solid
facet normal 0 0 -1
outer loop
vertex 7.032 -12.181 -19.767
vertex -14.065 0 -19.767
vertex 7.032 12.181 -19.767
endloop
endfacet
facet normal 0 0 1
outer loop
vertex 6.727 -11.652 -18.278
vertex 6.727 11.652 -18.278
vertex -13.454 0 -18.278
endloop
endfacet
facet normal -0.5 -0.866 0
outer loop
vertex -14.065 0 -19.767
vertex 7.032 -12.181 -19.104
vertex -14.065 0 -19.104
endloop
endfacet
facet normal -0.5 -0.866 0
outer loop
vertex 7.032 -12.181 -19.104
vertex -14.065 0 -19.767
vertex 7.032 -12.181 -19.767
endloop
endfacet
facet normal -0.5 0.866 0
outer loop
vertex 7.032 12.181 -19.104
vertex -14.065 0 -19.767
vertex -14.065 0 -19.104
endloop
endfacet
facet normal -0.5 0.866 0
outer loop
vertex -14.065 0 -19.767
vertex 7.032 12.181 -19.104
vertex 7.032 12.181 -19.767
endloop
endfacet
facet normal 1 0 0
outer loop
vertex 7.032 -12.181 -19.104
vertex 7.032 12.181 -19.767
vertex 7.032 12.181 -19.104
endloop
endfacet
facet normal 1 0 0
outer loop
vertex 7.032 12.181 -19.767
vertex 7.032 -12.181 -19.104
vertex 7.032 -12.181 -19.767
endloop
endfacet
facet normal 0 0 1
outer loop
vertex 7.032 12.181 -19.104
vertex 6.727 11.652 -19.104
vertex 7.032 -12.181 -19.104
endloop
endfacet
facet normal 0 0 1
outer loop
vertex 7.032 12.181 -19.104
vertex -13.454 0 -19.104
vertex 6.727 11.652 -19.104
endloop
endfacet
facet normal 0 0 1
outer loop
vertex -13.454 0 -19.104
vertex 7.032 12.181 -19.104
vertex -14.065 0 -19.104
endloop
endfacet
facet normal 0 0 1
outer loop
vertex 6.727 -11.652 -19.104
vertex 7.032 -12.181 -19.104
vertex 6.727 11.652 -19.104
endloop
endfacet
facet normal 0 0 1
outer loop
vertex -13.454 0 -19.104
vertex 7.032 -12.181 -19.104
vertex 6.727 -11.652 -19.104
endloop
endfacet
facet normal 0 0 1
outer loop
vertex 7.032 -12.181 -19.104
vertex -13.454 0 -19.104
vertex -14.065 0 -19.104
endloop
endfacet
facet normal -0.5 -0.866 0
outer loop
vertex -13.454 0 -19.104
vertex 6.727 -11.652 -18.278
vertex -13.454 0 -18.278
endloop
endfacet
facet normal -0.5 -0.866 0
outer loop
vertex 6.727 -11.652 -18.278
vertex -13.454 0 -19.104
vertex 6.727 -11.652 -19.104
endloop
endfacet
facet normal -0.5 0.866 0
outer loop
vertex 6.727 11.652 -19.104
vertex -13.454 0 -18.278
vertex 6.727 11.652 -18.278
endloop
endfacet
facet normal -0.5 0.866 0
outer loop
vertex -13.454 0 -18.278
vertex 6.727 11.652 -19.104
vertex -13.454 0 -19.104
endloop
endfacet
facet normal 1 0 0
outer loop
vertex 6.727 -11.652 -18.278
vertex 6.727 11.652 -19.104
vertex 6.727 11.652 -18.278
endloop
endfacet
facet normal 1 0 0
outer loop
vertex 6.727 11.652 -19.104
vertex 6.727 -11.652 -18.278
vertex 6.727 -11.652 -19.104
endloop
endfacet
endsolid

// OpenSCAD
angle = 20.905;
externalRadius = 25;
internalRdius = 23.117; // Pour épaisseur paroi 1.5 mm
diametreTrouBouchon = 1.5;
echelleReductionAjustementBouchon = 0.97;
r = 0.19; // résolution d'impression sur l'axe Z

//ico_creux();
//decoupe_bouchon();
//corps_ouvert();
bouchon();
//trou();

module corps_ouvert() {
    //rotate([180, 0, 0])
	difference() {
		ico_creux();
		decoupe_bouchon();
	}
}

module bouchon() {
    rotate([180, 0, 0])
	scale([echelleReductionAjustementBouchon, echelleReductionAjustementBouchon, 0.995])
	difference () {
        intersection() {
            ico_creux();
            decoupe_bouchon(echelleReductionAjustementBouchon);
        }
	}
}
module bouchon_trou(version) {
	scale([echelleReductionAjustementBouchon, echelleReductionAjustementBouchon, 0.98])
	difference () {
        intersection() {
            ico_creux();
            decoupe_bouchon(echelleReductionAjustementBouchon);
        }
        trou();
        // trou centre face
//		translate([0, 0, externalRadius*0.5])
//		cylinder(30, r=diametreTrouBouchon/2, $fn=22);
	}
}

module trou() {
    rotate([0, -37.3, 0])
		translate([0, 0, externalRadius*0.5])
		cylinder(30, r=diametreTrouBouchon/2, $fn=22);
}

module ico_creux() {
	difference() {
        rotate([0, angle, 0]) icosahedron(externalRadius);
        rotate([0, angle, 0]) icosahedron(internalRdius);
	}
}

module decoupe_bouchon(scale=1) {
	rotate([0,0,60]) translate([0,0,externalRadius*0.73+5*r])
		cylinder(6*r, r=externalRadius*0.58, $fn=3);
	rotate([0,0,60]) translate([0,0,externalRadius*0.73])
		cylinder(6*r, r=internalRdius*0.6, $fn=3);
}

module icosahedron(rad=1) {
	Cphi = (1+sqrt(5))/2;

	// Convert spherical to cartesian
	function sph_to_cart(c, rad) = [
		rad*sin(atan2(sqrt(c[0]*c[0]+c[1]*c[1]), c[2]))*cos(atan2(c[1],c[0])),  
		rad*sin(atan2(sqrt(c[0]*c[0]+c[1]*c[1]), c[2]))*sin(atan2(c[1],c[0])),
		rad*cos(atan2(sqrt(c[0]*c[0]+c[1]*c[1]), c[2]))
		];


	//================================================
	//	Icosahedron
	//================================================
	//
	// (0, +-1, +-Cphi)
	// (+-Cphi, 0, +-1)
	// (+-1, +-Cphi, 0)

	function icosa_unit(rad) = [
		sph_to_cart([0, +1, +Cphi], rad), 
		sph_to_cart([0, +1, -Cphi], rad),
		sph_to_cart([0, -1, -Cphi], rad),
		sph_to_cart([0, -1, +Cphi], rad),
		sph_to_cart([+Cphi, 0, +1], rad), 
		sph_to_cart([+Cphi, 0, -1], rad), 
		sph_to_cart([-Cphi, 0, -1], rad),
		sph_to_cart([-Cphi, 0, +1], rad),
		sph_to_cart([+1, +Cphi, 0], rad),
		sph_to_cart([+1, -Cphi, 0], rad), 
		sph_to_cart([-1, -Cphi, 0], rad), 
		sph_to_cart([-1, +Cphi, 0], rad),
		];

	icosa_faces = [ 
		[3,0,4],
		[3,4,9],
		[3,9,10],
		[3,10,7],
		[3,7,0],
		[0,8,4],
		[0,7,11],
		[0,11,8],
		[4,8,5],
		[4,5,9],
		[7,10,6],
		[7,6,11],
		[9,5,2],
		[9,2,10],
		[2,6,10],
		[1,5,8],
		[1,8,11],
		[1,11,6],
		[5,1,2],
		[2,1,6]
		];

	polyhedron(icosa_unit(rad), faces = icosa_faces);
}
